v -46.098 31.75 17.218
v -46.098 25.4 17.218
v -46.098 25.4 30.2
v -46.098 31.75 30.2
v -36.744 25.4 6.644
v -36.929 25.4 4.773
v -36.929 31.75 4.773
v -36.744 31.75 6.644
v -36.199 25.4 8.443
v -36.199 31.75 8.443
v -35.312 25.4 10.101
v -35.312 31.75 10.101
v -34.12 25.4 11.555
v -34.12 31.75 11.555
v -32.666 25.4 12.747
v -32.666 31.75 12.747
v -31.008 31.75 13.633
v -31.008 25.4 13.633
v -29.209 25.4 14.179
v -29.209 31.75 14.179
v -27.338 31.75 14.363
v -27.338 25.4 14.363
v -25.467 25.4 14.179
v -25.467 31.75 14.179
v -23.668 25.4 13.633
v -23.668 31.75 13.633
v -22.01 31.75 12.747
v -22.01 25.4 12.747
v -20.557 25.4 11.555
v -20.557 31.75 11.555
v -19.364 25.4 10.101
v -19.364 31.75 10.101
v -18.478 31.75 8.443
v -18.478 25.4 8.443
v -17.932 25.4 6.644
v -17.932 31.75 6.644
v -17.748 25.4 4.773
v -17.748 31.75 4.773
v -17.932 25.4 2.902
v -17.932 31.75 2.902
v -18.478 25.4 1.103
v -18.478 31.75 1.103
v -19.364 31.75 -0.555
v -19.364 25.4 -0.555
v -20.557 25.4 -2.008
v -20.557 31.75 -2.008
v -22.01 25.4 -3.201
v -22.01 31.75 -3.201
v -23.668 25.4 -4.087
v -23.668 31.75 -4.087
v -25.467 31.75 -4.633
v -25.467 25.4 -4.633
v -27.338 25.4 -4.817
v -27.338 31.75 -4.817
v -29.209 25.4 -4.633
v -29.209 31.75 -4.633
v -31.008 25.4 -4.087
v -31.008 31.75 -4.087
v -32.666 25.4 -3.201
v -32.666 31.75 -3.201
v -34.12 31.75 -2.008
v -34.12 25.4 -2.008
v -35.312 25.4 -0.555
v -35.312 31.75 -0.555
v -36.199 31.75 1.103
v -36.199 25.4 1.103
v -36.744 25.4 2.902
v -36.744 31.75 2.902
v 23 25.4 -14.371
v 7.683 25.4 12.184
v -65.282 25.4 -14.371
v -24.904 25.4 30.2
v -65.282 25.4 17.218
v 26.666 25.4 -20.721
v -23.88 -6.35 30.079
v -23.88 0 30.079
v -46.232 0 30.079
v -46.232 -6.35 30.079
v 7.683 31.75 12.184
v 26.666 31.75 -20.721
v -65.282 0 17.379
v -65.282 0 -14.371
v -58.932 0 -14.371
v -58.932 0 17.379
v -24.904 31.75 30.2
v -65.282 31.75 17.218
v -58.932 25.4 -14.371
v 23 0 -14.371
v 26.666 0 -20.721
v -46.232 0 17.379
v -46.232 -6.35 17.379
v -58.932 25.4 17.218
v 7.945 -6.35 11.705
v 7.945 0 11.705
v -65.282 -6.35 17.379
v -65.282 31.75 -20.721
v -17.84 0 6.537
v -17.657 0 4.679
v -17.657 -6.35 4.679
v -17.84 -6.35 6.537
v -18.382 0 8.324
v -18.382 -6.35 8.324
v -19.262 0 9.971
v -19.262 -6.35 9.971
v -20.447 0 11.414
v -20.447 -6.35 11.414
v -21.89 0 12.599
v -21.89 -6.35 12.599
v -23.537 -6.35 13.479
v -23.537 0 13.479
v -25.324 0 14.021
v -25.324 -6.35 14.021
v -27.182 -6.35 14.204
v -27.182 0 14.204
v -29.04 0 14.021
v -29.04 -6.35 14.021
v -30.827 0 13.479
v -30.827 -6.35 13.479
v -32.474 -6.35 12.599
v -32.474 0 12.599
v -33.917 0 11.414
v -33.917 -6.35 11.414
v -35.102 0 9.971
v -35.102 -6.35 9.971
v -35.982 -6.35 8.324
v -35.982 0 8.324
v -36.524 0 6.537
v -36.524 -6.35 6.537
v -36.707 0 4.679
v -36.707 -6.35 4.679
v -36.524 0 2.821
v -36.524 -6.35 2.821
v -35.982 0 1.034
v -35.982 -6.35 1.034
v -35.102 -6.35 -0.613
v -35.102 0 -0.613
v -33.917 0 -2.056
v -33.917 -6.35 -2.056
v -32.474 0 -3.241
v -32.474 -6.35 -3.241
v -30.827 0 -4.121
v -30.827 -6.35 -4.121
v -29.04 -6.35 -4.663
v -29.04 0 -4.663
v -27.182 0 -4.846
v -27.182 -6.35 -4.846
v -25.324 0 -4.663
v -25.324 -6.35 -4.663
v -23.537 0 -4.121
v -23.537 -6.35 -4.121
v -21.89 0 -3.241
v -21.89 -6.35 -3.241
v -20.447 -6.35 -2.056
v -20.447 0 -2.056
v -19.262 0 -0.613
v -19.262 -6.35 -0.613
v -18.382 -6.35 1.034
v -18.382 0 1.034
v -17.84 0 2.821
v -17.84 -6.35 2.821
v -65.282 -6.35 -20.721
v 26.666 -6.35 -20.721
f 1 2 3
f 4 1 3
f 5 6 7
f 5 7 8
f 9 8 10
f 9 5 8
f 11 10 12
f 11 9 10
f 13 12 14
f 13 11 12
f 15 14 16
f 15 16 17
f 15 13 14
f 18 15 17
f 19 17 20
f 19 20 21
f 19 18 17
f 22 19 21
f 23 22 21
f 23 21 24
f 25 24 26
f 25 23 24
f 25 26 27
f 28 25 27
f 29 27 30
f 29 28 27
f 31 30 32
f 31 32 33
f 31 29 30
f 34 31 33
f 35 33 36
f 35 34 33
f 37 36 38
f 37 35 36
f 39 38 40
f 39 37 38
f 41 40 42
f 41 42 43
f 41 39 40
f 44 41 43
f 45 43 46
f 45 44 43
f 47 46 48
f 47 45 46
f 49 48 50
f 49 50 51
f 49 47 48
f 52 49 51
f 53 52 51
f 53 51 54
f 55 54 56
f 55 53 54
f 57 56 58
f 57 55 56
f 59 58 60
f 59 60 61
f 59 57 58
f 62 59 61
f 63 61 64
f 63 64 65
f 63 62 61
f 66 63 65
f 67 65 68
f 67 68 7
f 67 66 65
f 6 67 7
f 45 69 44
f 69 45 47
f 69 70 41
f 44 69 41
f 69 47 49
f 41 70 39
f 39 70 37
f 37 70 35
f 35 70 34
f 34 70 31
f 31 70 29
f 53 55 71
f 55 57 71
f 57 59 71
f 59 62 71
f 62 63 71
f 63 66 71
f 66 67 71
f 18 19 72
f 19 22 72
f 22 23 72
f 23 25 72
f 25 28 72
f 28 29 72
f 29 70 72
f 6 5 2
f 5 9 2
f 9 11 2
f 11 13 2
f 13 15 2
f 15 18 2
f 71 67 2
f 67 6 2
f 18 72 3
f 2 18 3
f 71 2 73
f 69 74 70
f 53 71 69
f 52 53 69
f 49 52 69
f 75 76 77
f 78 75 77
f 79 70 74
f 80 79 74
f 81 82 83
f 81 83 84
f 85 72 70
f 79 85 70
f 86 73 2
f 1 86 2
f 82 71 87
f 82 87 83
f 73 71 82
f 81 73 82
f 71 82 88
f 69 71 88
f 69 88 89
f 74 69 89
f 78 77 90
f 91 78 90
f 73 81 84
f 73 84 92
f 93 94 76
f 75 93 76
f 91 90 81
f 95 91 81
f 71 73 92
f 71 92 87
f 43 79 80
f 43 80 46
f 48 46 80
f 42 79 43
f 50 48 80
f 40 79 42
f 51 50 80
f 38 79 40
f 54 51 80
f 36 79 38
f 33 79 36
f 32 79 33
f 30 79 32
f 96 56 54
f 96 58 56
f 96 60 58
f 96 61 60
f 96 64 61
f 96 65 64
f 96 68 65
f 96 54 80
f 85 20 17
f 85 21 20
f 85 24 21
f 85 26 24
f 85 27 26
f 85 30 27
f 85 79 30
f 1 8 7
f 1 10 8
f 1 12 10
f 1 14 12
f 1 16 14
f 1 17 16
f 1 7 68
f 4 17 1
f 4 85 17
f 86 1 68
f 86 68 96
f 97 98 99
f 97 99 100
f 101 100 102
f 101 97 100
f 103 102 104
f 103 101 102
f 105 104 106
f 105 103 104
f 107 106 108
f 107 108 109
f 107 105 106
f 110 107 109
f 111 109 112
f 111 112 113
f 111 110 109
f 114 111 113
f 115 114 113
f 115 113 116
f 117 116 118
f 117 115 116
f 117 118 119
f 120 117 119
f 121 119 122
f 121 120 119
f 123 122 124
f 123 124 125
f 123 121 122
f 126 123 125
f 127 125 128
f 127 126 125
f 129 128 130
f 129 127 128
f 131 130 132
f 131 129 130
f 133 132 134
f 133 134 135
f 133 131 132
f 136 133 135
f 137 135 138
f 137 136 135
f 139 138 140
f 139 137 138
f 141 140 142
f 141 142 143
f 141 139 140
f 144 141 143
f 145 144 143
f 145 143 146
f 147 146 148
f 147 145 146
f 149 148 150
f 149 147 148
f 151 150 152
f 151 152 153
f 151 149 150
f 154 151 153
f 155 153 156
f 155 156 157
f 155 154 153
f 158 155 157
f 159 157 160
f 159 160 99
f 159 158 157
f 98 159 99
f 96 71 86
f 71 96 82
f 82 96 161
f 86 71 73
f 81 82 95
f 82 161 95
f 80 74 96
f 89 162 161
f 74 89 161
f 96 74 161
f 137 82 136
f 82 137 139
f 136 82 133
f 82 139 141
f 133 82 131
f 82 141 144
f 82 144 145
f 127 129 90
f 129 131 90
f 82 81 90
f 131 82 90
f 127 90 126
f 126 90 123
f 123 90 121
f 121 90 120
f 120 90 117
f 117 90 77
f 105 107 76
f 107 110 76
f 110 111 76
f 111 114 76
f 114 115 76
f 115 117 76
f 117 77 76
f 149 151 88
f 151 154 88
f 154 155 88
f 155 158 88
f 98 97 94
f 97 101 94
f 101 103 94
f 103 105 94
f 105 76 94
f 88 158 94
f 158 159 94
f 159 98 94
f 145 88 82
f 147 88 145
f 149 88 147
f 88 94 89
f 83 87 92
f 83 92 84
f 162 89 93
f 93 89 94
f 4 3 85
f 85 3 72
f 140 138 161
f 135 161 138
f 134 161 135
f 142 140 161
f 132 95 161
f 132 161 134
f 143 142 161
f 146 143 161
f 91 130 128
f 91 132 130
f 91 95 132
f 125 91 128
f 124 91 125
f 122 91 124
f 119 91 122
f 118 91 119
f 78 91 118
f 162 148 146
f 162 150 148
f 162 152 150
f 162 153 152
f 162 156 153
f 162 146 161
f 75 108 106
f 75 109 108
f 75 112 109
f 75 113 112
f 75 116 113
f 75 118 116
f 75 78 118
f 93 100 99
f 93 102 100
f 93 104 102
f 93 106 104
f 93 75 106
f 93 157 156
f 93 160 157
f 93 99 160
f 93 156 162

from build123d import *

# Parameters (mm, degrees)
F0_R     = 9.525
F1_DEPTH = 6.35
F3_DEPTH = 25.4
F4_R     = 9.5903
F5_DEPTH = 6.35
F7_DEPTH = 6.35


with BuildPart() as f1:
    # F0 (on Front) → F1 (new body)
    with BuildSketch(Plane.XZ):
        Polygon((-65.281793, 17.379178), (-65.281793, -20.720822), (26.666207, -20.720822), (7.945116, 11.705058), (-23.879793, 30.079178), (-46.231793, 30.079178), (-46.231793, 17.379178), align=None)
        with Locations((-27.181793, 4.679178)):
            Circle(F0_R, mode=Mode.SUBTRACT)
    extrude(amount=F1_DEPTH)

    # F2 (on face) → F3 (join)
    with BuildSketch(Plane(origin=(0, 0, 0), x_dir=(-1, 0, 0), z_dir=(0, 1, 0))):
        Polygon((-23.000032, -14.370822), (-26.666207, -20.720822), (65.281793, -20.720822), (65.281793, -14.370822), align=None)
    extrude(amount=F3_DEPTH)

    # F4 (on face) → F5 (join)
    with BuildSketch(Plane(origin=(0, 25.4, 0), x_dir=(-1, 0, 0), z_dir=(0, 1, 0))):
        Polygon((-7.683079, 12.184195), (-26.666207, -20.720822), (65.281793, -20.720822), (65.281793, 17.217938), (46.098478, 17.217938), (46.098478, 30.19969), (24.903774, 30.19969), align=None)
        with Locations((27.338307, 4.773198)):
            Circle(F4_R, mode=Mode.SUBTRACT)
    extrude(amount=F5_DEPTH)


with BuildPart() as f7:
    # F6 (on face) → F7 (new body)
    with BuildSketch(Plane(origin=(-65.281793, 0, 0), x_dir=(0, -1, 0), z_dir=(-1, 0, 0))):
        Polygon((0, 17.379178), (-25.4, 17.217938), (-25.4, -14.370822), (0, -14.370822), align=None)
    extrude(amount=-F7_DEPTH)


solid = Compound([f1.part, f7.part])
